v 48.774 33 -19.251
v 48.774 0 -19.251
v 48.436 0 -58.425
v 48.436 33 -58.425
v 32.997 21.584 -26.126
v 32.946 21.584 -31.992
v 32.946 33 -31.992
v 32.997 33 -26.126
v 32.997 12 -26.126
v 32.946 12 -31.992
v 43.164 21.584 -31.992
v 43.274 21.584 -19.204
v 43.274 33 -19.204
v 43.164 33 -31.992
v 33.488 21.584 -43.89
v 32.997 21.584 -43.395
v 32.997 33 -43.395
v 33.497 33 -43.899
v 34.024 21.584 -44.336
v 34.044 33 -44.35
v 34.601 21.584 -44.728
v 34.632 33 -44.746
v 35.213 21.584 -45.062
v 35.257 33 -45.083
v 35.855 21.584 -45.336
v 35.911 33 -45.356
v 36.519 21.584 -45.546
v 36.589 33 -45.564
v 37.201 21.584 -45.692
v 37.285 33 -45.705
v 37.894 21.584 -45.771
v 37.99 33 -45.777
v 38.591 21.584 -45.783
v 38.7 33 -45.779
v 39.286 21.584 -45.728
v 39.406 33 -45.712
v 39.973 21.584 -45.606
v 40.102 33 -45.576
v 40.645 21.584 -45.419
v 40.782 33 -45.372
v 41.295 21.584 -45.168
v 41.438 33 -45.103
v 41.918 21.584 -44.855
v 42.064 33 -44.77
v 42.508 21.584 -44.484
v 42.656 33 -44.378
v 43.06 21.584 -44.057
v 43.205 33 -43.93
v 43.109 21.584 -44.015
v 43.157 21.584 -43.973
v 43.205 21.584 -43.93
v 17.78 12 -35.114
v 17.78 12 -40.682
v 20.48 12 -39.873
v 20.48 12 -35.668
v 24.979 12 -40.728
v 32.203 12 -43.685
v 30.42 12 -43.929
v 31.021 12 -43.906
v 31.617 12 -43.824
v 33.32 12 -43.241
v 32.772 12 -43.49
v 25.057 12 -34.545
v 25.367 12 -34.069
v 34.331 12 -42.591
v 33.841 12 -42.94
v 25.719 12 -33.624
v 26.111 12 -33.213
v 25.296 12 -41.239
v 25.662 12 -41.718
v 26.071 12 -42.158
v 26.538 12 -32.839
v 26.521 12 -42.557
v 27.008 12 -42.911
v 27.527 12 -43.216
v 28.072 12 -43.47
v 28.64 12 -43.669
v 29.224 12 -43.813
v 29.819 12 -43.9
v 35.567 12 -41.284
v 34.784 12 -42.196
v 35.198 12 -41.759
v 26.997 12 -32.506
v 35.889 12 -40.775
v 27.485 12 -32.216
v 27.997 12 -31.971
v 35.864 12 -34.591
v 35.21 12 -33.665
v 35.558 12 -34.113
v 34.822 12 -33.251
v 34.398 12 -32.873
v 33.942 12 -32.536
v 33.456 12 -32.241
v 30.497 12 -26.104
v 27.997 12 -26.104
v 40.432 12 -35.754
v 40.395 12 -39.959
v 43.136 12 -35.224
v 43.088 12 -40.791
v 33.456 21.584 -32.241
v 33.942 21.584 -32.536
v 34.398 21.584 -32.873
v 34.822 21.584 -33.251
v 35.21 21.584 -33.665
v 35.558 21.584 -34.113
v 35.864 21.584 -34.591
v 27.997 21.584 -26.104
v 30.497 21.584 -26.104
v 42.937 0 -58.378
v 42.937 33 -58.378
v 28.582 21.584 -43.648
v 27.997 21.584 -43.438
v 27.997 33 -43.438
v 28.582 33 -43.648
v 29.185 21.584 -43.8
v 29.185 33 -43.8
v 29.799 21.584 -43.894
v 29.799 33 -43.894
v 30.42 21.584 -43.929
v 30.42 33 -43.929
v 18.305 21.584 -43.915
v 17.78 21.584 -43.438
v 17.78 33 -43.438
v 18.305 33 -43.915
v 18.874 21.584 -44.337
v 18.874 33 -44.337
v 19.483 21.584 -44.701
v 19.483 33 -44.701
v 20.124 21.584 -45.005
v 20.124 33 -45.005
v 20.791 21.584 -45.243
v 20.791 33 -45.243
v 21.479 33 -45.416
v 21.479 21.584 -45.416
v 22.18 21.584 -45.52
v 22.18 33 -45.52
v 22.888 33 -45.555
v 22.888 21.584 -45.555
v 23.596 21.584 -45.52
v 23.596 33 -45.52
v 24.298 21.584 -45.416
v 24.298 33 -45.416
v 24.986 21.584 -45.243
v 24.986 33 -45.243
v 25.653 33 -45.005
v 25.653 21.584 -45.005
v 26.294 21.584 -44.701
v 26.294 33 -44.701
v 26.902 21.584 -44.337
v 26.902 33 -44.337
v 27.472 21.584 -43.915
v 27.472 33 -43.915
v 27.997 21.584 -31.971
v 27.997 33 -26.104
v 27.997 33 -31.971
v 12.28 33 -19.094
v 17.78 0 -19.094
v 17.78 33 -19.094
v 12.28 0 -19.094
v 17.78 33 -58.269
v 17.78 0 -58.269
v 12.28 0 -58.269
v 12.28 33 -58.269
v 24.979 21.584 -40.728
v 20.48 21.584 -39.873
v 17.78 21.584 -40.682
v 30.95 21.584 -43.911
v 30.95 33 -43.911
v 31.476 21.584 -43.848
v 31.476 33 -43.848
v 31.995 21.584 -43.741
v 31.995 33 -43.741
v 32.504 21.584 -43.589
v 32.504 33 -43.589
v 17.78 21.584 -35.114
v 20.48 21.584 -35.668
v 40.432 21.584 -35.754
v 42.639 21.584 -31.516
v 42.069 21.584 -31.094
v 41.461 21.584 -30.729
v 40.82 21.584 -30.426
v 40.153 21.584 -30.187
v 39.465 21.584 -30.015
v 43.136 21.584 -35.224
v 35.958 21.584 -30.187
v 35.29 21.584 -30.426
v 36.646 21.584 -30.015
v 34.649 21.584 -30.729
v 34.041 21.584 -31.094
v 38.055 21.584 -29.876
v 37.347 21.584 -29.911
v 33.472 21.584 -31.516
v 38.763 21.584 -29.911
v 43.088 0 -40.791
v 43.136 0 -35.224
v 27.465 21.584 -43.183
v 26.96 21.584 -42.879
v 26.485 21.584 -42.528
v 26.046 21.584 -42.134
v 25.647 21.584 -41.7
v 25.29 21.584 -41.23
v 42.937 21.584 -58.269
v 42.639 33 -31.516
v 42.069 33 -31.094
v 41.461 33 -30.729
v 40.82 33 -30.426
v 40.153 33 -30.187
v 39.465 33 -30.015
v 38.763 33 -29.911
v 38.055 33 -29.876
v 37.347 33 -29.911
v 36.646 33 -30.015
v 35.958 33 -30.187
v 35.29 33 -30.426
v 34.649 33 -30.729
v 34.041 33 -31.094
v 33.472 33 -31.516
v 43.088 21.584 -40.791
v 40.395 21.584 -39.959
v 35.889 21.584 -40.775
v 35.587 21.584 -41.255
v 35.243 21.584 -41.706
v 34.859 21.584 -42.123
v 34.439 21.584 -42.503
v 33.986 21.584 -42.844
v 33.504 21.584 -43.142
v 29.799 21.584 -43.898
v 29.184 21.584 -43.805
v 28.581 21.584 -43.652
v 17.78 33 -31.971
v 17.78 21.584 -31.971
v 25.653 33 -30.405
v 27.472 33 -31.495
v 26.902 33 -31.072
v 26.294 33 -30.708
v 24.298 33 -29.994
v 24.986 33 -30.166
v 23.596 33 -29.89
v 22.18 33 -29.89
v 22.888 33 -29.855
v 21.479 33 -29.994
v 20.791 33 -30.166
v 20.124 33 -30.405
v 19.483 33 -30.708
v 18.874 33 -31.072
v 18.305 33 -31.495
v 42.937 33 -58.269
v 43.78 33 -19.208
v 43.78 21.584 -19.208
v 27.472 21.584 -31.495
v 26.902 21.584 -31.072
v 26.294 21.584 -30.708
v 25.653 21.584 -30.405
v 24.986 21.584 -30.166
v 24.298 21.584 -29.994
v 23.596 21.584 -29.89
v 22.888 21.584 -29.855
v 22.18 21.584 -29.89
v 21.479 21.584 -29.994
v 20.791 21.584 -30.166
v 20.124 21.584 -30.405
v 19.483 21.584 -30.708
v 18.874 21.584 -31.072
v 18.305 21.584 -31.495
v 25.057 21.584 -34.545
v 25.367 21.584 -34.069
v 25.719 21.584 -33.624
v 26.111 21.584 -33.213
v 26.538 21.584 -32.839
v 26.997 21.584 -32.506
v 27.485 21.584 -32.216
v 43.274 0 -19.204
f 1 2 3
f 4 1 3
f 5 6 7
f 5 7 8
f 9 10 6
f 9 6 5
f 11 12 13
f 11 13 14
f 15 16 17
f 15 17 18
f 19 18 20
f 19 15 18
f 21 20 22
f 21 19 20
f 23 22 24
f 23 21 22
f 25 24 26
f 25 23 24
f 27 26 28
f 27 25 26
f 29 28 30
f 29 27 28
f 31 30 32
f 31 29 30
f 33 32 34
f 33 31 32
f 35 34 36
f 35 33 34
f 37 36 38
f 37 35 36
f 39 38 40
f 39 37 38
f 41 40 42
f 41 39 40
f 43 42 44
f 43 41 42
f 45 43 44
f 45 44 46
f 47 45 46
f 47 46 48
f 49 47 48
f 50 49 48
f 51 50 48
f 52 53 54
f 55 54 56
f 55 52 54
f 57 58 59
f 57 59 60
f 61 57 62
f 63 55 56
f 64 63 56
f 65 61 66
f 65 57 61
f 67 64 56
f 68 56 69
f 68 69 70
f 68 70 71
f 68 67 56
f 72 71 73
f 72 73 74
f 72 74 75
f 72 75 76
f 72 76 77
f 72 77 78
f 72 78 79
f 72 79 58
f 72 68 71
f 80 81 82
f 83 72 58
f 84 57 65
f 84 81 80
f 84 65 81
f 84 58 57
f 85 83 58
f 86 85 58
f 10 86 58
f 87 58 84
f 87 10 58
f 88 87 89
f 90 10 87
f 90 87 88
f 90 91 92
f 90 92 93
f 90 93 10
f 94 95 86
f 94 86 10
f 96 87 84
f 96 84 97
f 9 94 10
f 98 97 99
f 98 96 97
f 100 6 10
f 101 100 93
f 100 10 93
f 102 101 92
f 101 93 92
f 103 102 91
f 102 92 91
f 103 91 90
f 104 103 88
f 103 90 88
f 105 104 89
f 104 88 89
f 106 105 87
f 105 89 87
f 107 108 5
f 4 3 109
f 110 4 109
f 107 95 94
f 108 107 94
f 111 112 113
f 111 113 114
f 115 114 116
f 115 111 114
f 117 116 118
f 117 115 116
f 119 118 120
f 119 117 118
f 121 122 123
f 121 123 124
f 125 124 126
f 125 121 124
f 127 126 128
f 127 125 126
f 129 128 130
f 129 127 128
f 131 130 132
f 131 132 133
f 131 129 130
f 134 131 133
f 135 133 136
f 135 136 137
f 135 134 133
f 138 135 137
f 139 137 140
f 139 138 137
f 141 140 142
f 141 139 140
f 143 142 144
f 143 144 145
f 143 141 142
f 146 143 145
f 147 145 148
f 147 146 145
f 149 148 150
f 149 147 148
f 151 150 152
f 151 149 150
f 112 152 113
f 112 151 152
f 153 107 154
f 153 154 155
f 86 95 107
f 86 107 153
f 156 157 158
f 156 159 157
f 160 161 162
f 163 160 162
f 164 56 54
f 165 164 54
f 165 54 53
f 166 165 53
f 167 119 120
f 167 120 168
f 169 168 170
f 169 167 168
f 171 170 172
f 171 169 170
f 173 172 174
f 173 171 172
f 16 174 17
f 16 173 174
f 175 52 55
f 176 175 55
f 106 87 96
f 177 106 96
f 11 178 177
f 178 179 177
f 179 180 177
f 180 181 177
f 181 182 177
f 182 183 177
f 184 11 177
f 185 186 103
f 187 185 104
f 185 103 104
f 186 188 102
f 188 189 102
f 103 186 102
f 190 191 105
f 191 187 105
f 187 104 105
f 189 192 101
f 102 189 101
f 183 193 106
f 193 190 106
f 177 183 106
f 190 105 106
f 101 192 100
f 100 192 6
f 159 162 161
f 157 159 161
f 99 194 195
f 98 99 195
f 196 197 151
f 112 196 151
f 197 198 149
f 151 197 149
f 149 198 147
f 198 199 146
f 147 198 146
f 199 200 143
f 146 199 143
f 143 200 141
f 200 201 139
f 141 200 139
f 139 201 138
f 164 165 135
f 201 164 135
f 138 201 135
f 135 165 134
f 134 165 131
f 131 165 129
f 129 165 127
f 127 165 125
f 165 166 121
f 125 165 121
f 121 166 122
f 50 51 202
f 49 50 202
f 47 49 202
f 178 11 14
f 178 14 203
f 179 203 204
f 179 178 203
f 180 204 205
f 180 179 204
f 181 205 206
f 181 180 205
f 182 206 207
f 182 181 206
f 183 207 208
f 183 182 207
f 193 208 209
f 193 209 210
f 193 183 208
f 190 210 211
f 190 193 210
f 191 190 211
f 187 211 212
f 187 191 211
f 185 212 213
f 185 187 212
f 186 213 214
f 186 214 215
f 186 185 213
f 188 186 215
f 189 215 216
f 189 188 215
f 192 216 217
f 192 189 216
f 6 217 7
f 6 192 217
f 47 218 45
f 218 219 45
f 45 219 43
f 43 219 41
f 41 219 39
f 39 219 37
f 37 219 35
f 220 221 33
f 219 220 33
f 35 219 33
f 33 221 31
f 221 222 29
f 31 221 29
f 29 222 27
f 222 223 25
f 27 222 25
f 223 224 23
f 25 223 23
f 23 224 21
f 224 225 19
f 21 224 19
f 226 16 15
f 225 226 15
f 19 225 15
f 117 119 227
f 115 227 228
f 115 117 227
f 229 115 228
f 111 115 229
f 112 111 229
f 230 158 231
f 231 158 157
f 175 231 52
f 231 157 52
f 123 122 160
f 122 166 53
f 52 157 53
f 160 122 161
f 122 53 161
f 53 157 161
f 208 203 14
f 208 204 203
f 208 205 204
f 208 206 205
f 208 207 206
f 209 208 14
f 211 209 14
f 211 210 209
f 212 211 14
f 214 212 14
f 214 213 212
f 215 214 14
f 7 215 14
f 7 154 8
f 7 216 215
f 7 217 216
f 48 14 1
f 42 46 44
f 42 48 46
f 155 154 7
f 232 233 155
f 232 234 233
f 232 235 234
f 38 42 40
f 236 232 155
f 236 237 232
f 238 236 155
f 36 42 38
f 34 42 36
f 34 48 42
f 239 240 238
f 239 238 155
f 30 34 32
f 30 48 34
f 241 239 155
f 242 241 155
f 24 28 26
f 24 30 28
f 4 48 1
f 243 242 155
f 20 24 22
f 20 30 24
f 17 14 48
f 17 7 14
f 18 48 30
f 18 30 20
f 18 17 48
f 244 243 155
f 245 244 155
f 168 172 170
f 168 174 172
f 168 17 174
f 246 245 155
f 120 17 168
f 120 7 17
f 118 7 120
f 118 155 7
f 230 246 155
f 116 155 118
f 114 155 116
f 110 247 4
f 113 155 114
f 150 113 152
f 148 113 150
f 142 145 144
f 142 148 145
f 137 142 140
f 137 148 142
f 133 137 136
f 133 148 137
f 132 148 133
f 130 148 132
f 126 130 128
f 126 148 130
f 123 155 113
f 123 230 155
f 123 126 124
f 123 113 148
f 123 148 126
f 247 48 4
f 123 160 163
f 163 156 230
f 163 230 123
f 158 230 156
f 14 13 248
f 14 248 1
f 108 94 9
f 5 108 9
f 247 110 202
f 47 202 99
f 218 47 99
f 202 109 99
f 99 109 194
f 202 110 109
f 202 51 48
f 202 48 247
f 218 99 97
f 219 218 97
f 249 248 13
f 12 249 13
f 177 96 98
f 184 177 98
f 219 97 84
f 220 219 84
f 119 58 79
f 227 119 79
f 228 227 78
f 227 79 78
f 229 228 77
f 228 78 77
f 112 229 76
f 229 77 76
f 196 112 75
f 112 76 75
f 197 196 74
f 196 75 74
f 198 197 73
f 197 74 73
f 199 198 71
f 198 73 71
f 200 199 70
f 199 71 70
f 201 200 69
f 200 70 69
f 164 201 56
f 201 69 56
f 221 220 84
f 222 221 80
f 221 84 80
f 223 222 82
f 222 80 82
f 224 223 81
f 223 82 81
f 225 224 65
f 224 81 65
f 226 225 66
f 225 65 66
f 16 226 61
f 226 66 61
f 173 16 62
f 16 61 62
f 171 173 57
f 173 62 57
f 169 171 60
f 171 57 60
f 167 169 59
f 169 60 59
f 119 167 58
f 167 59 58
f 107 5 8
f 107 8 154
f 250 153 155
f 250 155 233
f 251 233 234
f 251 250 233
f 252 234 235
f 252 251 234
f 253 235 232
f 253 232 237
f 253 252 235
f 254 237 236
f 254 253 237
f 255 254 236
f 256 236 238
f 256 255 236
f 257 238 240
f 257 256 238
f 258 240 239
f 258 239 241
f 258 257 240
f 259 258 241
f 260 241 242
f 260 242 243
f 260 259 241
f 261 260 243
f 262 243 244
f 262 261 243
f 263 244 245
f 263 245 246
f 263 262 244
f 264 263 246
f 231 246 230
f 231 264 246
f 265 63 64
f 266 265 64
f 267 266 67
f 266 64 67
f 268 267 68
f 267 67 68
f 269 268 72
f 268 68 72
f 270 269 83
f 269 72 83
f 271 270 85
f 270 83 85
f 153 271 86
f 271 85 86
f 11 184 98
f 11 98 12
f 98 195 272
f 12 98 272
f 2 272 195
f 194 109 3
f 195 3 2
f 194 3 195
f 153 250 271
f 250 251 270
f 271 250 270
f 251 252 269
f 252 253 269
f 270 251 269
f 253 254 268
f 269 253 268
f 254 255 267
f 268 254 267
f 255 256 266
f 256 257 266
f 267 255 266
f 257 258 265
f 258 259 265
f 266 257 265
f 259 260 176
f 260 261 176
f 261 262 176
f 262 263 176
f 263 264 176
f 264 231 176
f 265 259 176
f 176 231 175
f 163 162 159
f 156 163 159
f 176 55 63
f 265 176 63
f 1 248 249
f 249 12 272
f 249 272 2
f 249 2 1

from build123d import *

# Parameters (mm, degrees)
BOSS_EXTRUDE1_DEPTH     = 33
CUT_EXTRUDE1_DEPTH      = 83.954293528
CUT_EXTRUDE1_DEPTH_BACK = 12
SKETCH3_W               = 9.481209811
SKETCH3_H               = 17.021727652
CUT_EXTRUDE2_DEPTH      = 22
SKETCH6_W               = 39.175540074
SKETCH6_H               = 11.416045591
BOSS_EXTRUDE3_DEPTH     = 26
CUT_EXTRUDE3_DEPTH      = 26


with BuildPart() as part:
    # Sketch1 → Boss-Extrude1 (new body)
    with BuildSketch(Plane(origin=(0, 0, 0), x_dir=(1, 0, 0), z_dir=(0, 1, 0))):
        with BuildLine():
            Line((27.99701897, 26.104397373), (30.497019389, 26.104397373))
            Line((30.497019389, 26.104397373), (32.996926828, 26.125958592))
            Line((32.996926828, 26.125958592), (32.946330796, 31.992296402))
            ThreePointArc((32.946330796, 31.992296402), (34.614300355, 33.056919945), (35.86386473, 34.591238885))
            Line((35.86386473, 34.591238885), (40.431539769, 35.753760832))
            Line((40.431539769, 35.753760832), (43.136211097, 35.223788843))
            Line((43.136211097, 35.223788843), (43.274382132, 19.203600277))
            Line((43.274382132, 19.203600277), (48.774177579, 19.251034952))
            Line((48.774177579, 19.251034952), (48.43630867, 58.425118026))
            Line((48.43630867, 58.425118026), (42.936513223, 58.377683351))
            Line((42.936513223, 58.377683351), (43.088196039, 40.790876563))
            Line((43.088196039, 40.790876563), (40.395268448, 39.959225491))
            Line((40.395268448, 39.959225491), (35.888631414, 40.775372904))
            ThreePointArc((35.888631414, 40.775372904), (33.583892359, 43.097075019), (30.420151943, 43.929462788))
            ThreePointArc((30.420151943, 43.929462788), (27.263708108, 43.06982034), (24.979078258, 40.728327384))
            Line((24.979078258, 40.728327384), (20.479647685, 39.873342894))
            Line((20.479647685, 39.873342894), (17.779647685, 40.681737919))
            Line((17.779647685, 40.681737919), (17.779647685, 58.269198812))
            Line((17.779647685, 58.269198812), (12.279647685, 58.269198812))
            Line((12.279647685, 58.269198812), (12.279647685, 19.093658738))
            Line((12.279647685, 19.093658738), (17.779647685, 19.093658738))
            Line((17.779647685, 19.093658738), (17.779647685, 35.114443143))
            Line((17.779647685, 35.114443143), (20.479647685, 35.667721822))
            Line((20.479647685, 35.667721822), (25.057179, 34.544636961))
            ThreePointArc((25.057179, 34.544636961), (26.319929615, 33.021151936), (27.99701897, 31.970953369))
            Line((27.99701897, 31.970953369), (27.99701897, 26.104397373))
        make_face()
    extrude(amount=BOSS_EXTRUDE1_DEPTH)

    # Sketch2 → Cut-Extrude1 (cut, two sides: drawn at the far end of the back side and taken through both)
    with BuildSketch(Plane.XZ.offset(-CUT_EXTRUDE1_DEPTH_BACK)):
        with BuildLine():
            Line((20.479647685, -35.667721822), (17.779647685, -35.114443143))
            Line((17.779647685, -35.114443143), (17.779647685, -40.681737919))
            Line((17.779647685, -40.681737919), (20.479647685, -39.873342894))
            Line((20.479647685, -39.873342894), (24.979078258, -40.728327384))
            ThreePointArc((24.979078258, -40.728327384), (27.263708108, -43.06982034), (30.420151943, -43.929462788))
            ThreePointArc((30.420151943, -43.929462788), (33.576595778, -43.084424394), (35.888631414, -40.775372904))
            Line((35.888631414, -40.775372904), (40.395268448, -39.959225491))
            Line((40.395268448, -39.959225491), (43.088196039, -40.790876563))
            Line((43.088196039, -40.790876563), (43.136211097, -35.223788843))
            Line((43.136211097, -35.223788843), (40.431539769, -35.753760832))
            Line((40.431539769, -35.753760832), (35.86386473, -34.591238885))
            ThreePointArc((35.86386473, -34.591238885), (34.614300355, -33.056919945), (32.946330796, -31.992296402))
            Line((32.946330796, -31.992296402), (32.996926828, -26.125958592))
            Line((32.996926828, -26.125958592), (27.99701897, -26.104397373))
            Line((27.99701897, -26.104397373), (27.99701897, -31.970953369))
            ThreePointArc((27.99701897, -31.970953369), (26.319929615, -33.021151936), (25.057179, -34.544636961))
            Line((25.057179, -34.544636961), (20.479647685, -35.667721822))
        make_face()
    extrude(amount=CUT_EXTRUDE1_DEPTH + CUT_EXTRUDE1_DEPTH_BACK, mode=Mode.SUBTRACT)

    # Sketch3 → Cut-Extrude2 (cut)
    with BuildSketch(Plane.XY.offset(-26.104397373)):
        with Locations((32.737623876, 3.489136174)):
            Rectangle(SKETCH3_W, SKETCH3_H)
    extrude(amount=-CUT_EXTRUDE2_DEPTH, mode=Mode.SUBTRACT)

    # Sketch6 → Boss-Extrude3 (add)
    with BuildSketch(Plane(origin=(17.779647685, 0, 0), x_dir=(0, 0, -1), z_dir=(1, 0, 0))):
        with Locations((38.681428775, 27.291977205)):
            Rectangle(SKETCH6_W, SKETCH6_H)
    extrude(amount=BOSS_EXTRUDE3_DEPTH)

    # Sketch7 → Cut-Extrude3 (cut)
    with BuildSketch(Plane.XZ.offset(-21.583954409)):
        with BuildLine():
            Line((32.946330796, -31.992296402), (32.996926828, -26.125958592))
            Line((32.996926828, -26.125958592), (27.99701897, -26.104397373))
            Line((27.99701897, -26.104397373), (27.99701897, -31.970953369))
            ThreePointArc((27.99701897, -31.970953369), (22.888333328, -29.85486649), (17.779647685, -31.970953369))
            Line((17.779647685, -31.970953369), (17.779647685, -19.093658738))
            Line((17.779647685, -19.093658738), (43.274382132, -19.093658738))
            Line((43.274382132, -19.093658738), (43.779647685, -19.093658738))
            Line((43.779647685, -19.093658738), (43.779647685, -19.207958095))
            Line((43.779647685, -19.207958095), (43.274382132, -19.203600277))
            Line((43.274382132, -19.203600277), (43.164082095, -31.992296402))
            ThreePointArc((43.164082095, -31.992296402), (38.055206446, -29.876130819), (32.946330796, -31.992296402))
        make_face()
        with BuildLine():
            Line((43.205296614, -43.929694297), (42.937448882, -58.269198812))
            Line((42.937448882, -58.269198812), (17.779647685, -58.269198812))
            Line((17.779647685, -58.269198812), (17.779647685, -43.438467364))
            ThreePointArc((17.779647685, -43.438467364), (22.888333328, -45.554554244), (27.99701897, -43.438467364))
            ThreePointArc((27.99701897, -43.438467364), (29.185032105, -43.80020425), (30.420151943, -43.929462788))
            ThreePointArc((30.420151943, -43.929462788), (31.737082796, -43.800165691), (32.996926828, -43.395421786))
            ThreePointArc((32.996926828, -43.395421786), (37.990460261, -45.776780649), (43.205296614, -43.929694297))
        make_face()
    extrude(amount=-CUT_EXTRUDE3_DEPTH, mode=Mode.SUBTRACT)


solid = part.part
